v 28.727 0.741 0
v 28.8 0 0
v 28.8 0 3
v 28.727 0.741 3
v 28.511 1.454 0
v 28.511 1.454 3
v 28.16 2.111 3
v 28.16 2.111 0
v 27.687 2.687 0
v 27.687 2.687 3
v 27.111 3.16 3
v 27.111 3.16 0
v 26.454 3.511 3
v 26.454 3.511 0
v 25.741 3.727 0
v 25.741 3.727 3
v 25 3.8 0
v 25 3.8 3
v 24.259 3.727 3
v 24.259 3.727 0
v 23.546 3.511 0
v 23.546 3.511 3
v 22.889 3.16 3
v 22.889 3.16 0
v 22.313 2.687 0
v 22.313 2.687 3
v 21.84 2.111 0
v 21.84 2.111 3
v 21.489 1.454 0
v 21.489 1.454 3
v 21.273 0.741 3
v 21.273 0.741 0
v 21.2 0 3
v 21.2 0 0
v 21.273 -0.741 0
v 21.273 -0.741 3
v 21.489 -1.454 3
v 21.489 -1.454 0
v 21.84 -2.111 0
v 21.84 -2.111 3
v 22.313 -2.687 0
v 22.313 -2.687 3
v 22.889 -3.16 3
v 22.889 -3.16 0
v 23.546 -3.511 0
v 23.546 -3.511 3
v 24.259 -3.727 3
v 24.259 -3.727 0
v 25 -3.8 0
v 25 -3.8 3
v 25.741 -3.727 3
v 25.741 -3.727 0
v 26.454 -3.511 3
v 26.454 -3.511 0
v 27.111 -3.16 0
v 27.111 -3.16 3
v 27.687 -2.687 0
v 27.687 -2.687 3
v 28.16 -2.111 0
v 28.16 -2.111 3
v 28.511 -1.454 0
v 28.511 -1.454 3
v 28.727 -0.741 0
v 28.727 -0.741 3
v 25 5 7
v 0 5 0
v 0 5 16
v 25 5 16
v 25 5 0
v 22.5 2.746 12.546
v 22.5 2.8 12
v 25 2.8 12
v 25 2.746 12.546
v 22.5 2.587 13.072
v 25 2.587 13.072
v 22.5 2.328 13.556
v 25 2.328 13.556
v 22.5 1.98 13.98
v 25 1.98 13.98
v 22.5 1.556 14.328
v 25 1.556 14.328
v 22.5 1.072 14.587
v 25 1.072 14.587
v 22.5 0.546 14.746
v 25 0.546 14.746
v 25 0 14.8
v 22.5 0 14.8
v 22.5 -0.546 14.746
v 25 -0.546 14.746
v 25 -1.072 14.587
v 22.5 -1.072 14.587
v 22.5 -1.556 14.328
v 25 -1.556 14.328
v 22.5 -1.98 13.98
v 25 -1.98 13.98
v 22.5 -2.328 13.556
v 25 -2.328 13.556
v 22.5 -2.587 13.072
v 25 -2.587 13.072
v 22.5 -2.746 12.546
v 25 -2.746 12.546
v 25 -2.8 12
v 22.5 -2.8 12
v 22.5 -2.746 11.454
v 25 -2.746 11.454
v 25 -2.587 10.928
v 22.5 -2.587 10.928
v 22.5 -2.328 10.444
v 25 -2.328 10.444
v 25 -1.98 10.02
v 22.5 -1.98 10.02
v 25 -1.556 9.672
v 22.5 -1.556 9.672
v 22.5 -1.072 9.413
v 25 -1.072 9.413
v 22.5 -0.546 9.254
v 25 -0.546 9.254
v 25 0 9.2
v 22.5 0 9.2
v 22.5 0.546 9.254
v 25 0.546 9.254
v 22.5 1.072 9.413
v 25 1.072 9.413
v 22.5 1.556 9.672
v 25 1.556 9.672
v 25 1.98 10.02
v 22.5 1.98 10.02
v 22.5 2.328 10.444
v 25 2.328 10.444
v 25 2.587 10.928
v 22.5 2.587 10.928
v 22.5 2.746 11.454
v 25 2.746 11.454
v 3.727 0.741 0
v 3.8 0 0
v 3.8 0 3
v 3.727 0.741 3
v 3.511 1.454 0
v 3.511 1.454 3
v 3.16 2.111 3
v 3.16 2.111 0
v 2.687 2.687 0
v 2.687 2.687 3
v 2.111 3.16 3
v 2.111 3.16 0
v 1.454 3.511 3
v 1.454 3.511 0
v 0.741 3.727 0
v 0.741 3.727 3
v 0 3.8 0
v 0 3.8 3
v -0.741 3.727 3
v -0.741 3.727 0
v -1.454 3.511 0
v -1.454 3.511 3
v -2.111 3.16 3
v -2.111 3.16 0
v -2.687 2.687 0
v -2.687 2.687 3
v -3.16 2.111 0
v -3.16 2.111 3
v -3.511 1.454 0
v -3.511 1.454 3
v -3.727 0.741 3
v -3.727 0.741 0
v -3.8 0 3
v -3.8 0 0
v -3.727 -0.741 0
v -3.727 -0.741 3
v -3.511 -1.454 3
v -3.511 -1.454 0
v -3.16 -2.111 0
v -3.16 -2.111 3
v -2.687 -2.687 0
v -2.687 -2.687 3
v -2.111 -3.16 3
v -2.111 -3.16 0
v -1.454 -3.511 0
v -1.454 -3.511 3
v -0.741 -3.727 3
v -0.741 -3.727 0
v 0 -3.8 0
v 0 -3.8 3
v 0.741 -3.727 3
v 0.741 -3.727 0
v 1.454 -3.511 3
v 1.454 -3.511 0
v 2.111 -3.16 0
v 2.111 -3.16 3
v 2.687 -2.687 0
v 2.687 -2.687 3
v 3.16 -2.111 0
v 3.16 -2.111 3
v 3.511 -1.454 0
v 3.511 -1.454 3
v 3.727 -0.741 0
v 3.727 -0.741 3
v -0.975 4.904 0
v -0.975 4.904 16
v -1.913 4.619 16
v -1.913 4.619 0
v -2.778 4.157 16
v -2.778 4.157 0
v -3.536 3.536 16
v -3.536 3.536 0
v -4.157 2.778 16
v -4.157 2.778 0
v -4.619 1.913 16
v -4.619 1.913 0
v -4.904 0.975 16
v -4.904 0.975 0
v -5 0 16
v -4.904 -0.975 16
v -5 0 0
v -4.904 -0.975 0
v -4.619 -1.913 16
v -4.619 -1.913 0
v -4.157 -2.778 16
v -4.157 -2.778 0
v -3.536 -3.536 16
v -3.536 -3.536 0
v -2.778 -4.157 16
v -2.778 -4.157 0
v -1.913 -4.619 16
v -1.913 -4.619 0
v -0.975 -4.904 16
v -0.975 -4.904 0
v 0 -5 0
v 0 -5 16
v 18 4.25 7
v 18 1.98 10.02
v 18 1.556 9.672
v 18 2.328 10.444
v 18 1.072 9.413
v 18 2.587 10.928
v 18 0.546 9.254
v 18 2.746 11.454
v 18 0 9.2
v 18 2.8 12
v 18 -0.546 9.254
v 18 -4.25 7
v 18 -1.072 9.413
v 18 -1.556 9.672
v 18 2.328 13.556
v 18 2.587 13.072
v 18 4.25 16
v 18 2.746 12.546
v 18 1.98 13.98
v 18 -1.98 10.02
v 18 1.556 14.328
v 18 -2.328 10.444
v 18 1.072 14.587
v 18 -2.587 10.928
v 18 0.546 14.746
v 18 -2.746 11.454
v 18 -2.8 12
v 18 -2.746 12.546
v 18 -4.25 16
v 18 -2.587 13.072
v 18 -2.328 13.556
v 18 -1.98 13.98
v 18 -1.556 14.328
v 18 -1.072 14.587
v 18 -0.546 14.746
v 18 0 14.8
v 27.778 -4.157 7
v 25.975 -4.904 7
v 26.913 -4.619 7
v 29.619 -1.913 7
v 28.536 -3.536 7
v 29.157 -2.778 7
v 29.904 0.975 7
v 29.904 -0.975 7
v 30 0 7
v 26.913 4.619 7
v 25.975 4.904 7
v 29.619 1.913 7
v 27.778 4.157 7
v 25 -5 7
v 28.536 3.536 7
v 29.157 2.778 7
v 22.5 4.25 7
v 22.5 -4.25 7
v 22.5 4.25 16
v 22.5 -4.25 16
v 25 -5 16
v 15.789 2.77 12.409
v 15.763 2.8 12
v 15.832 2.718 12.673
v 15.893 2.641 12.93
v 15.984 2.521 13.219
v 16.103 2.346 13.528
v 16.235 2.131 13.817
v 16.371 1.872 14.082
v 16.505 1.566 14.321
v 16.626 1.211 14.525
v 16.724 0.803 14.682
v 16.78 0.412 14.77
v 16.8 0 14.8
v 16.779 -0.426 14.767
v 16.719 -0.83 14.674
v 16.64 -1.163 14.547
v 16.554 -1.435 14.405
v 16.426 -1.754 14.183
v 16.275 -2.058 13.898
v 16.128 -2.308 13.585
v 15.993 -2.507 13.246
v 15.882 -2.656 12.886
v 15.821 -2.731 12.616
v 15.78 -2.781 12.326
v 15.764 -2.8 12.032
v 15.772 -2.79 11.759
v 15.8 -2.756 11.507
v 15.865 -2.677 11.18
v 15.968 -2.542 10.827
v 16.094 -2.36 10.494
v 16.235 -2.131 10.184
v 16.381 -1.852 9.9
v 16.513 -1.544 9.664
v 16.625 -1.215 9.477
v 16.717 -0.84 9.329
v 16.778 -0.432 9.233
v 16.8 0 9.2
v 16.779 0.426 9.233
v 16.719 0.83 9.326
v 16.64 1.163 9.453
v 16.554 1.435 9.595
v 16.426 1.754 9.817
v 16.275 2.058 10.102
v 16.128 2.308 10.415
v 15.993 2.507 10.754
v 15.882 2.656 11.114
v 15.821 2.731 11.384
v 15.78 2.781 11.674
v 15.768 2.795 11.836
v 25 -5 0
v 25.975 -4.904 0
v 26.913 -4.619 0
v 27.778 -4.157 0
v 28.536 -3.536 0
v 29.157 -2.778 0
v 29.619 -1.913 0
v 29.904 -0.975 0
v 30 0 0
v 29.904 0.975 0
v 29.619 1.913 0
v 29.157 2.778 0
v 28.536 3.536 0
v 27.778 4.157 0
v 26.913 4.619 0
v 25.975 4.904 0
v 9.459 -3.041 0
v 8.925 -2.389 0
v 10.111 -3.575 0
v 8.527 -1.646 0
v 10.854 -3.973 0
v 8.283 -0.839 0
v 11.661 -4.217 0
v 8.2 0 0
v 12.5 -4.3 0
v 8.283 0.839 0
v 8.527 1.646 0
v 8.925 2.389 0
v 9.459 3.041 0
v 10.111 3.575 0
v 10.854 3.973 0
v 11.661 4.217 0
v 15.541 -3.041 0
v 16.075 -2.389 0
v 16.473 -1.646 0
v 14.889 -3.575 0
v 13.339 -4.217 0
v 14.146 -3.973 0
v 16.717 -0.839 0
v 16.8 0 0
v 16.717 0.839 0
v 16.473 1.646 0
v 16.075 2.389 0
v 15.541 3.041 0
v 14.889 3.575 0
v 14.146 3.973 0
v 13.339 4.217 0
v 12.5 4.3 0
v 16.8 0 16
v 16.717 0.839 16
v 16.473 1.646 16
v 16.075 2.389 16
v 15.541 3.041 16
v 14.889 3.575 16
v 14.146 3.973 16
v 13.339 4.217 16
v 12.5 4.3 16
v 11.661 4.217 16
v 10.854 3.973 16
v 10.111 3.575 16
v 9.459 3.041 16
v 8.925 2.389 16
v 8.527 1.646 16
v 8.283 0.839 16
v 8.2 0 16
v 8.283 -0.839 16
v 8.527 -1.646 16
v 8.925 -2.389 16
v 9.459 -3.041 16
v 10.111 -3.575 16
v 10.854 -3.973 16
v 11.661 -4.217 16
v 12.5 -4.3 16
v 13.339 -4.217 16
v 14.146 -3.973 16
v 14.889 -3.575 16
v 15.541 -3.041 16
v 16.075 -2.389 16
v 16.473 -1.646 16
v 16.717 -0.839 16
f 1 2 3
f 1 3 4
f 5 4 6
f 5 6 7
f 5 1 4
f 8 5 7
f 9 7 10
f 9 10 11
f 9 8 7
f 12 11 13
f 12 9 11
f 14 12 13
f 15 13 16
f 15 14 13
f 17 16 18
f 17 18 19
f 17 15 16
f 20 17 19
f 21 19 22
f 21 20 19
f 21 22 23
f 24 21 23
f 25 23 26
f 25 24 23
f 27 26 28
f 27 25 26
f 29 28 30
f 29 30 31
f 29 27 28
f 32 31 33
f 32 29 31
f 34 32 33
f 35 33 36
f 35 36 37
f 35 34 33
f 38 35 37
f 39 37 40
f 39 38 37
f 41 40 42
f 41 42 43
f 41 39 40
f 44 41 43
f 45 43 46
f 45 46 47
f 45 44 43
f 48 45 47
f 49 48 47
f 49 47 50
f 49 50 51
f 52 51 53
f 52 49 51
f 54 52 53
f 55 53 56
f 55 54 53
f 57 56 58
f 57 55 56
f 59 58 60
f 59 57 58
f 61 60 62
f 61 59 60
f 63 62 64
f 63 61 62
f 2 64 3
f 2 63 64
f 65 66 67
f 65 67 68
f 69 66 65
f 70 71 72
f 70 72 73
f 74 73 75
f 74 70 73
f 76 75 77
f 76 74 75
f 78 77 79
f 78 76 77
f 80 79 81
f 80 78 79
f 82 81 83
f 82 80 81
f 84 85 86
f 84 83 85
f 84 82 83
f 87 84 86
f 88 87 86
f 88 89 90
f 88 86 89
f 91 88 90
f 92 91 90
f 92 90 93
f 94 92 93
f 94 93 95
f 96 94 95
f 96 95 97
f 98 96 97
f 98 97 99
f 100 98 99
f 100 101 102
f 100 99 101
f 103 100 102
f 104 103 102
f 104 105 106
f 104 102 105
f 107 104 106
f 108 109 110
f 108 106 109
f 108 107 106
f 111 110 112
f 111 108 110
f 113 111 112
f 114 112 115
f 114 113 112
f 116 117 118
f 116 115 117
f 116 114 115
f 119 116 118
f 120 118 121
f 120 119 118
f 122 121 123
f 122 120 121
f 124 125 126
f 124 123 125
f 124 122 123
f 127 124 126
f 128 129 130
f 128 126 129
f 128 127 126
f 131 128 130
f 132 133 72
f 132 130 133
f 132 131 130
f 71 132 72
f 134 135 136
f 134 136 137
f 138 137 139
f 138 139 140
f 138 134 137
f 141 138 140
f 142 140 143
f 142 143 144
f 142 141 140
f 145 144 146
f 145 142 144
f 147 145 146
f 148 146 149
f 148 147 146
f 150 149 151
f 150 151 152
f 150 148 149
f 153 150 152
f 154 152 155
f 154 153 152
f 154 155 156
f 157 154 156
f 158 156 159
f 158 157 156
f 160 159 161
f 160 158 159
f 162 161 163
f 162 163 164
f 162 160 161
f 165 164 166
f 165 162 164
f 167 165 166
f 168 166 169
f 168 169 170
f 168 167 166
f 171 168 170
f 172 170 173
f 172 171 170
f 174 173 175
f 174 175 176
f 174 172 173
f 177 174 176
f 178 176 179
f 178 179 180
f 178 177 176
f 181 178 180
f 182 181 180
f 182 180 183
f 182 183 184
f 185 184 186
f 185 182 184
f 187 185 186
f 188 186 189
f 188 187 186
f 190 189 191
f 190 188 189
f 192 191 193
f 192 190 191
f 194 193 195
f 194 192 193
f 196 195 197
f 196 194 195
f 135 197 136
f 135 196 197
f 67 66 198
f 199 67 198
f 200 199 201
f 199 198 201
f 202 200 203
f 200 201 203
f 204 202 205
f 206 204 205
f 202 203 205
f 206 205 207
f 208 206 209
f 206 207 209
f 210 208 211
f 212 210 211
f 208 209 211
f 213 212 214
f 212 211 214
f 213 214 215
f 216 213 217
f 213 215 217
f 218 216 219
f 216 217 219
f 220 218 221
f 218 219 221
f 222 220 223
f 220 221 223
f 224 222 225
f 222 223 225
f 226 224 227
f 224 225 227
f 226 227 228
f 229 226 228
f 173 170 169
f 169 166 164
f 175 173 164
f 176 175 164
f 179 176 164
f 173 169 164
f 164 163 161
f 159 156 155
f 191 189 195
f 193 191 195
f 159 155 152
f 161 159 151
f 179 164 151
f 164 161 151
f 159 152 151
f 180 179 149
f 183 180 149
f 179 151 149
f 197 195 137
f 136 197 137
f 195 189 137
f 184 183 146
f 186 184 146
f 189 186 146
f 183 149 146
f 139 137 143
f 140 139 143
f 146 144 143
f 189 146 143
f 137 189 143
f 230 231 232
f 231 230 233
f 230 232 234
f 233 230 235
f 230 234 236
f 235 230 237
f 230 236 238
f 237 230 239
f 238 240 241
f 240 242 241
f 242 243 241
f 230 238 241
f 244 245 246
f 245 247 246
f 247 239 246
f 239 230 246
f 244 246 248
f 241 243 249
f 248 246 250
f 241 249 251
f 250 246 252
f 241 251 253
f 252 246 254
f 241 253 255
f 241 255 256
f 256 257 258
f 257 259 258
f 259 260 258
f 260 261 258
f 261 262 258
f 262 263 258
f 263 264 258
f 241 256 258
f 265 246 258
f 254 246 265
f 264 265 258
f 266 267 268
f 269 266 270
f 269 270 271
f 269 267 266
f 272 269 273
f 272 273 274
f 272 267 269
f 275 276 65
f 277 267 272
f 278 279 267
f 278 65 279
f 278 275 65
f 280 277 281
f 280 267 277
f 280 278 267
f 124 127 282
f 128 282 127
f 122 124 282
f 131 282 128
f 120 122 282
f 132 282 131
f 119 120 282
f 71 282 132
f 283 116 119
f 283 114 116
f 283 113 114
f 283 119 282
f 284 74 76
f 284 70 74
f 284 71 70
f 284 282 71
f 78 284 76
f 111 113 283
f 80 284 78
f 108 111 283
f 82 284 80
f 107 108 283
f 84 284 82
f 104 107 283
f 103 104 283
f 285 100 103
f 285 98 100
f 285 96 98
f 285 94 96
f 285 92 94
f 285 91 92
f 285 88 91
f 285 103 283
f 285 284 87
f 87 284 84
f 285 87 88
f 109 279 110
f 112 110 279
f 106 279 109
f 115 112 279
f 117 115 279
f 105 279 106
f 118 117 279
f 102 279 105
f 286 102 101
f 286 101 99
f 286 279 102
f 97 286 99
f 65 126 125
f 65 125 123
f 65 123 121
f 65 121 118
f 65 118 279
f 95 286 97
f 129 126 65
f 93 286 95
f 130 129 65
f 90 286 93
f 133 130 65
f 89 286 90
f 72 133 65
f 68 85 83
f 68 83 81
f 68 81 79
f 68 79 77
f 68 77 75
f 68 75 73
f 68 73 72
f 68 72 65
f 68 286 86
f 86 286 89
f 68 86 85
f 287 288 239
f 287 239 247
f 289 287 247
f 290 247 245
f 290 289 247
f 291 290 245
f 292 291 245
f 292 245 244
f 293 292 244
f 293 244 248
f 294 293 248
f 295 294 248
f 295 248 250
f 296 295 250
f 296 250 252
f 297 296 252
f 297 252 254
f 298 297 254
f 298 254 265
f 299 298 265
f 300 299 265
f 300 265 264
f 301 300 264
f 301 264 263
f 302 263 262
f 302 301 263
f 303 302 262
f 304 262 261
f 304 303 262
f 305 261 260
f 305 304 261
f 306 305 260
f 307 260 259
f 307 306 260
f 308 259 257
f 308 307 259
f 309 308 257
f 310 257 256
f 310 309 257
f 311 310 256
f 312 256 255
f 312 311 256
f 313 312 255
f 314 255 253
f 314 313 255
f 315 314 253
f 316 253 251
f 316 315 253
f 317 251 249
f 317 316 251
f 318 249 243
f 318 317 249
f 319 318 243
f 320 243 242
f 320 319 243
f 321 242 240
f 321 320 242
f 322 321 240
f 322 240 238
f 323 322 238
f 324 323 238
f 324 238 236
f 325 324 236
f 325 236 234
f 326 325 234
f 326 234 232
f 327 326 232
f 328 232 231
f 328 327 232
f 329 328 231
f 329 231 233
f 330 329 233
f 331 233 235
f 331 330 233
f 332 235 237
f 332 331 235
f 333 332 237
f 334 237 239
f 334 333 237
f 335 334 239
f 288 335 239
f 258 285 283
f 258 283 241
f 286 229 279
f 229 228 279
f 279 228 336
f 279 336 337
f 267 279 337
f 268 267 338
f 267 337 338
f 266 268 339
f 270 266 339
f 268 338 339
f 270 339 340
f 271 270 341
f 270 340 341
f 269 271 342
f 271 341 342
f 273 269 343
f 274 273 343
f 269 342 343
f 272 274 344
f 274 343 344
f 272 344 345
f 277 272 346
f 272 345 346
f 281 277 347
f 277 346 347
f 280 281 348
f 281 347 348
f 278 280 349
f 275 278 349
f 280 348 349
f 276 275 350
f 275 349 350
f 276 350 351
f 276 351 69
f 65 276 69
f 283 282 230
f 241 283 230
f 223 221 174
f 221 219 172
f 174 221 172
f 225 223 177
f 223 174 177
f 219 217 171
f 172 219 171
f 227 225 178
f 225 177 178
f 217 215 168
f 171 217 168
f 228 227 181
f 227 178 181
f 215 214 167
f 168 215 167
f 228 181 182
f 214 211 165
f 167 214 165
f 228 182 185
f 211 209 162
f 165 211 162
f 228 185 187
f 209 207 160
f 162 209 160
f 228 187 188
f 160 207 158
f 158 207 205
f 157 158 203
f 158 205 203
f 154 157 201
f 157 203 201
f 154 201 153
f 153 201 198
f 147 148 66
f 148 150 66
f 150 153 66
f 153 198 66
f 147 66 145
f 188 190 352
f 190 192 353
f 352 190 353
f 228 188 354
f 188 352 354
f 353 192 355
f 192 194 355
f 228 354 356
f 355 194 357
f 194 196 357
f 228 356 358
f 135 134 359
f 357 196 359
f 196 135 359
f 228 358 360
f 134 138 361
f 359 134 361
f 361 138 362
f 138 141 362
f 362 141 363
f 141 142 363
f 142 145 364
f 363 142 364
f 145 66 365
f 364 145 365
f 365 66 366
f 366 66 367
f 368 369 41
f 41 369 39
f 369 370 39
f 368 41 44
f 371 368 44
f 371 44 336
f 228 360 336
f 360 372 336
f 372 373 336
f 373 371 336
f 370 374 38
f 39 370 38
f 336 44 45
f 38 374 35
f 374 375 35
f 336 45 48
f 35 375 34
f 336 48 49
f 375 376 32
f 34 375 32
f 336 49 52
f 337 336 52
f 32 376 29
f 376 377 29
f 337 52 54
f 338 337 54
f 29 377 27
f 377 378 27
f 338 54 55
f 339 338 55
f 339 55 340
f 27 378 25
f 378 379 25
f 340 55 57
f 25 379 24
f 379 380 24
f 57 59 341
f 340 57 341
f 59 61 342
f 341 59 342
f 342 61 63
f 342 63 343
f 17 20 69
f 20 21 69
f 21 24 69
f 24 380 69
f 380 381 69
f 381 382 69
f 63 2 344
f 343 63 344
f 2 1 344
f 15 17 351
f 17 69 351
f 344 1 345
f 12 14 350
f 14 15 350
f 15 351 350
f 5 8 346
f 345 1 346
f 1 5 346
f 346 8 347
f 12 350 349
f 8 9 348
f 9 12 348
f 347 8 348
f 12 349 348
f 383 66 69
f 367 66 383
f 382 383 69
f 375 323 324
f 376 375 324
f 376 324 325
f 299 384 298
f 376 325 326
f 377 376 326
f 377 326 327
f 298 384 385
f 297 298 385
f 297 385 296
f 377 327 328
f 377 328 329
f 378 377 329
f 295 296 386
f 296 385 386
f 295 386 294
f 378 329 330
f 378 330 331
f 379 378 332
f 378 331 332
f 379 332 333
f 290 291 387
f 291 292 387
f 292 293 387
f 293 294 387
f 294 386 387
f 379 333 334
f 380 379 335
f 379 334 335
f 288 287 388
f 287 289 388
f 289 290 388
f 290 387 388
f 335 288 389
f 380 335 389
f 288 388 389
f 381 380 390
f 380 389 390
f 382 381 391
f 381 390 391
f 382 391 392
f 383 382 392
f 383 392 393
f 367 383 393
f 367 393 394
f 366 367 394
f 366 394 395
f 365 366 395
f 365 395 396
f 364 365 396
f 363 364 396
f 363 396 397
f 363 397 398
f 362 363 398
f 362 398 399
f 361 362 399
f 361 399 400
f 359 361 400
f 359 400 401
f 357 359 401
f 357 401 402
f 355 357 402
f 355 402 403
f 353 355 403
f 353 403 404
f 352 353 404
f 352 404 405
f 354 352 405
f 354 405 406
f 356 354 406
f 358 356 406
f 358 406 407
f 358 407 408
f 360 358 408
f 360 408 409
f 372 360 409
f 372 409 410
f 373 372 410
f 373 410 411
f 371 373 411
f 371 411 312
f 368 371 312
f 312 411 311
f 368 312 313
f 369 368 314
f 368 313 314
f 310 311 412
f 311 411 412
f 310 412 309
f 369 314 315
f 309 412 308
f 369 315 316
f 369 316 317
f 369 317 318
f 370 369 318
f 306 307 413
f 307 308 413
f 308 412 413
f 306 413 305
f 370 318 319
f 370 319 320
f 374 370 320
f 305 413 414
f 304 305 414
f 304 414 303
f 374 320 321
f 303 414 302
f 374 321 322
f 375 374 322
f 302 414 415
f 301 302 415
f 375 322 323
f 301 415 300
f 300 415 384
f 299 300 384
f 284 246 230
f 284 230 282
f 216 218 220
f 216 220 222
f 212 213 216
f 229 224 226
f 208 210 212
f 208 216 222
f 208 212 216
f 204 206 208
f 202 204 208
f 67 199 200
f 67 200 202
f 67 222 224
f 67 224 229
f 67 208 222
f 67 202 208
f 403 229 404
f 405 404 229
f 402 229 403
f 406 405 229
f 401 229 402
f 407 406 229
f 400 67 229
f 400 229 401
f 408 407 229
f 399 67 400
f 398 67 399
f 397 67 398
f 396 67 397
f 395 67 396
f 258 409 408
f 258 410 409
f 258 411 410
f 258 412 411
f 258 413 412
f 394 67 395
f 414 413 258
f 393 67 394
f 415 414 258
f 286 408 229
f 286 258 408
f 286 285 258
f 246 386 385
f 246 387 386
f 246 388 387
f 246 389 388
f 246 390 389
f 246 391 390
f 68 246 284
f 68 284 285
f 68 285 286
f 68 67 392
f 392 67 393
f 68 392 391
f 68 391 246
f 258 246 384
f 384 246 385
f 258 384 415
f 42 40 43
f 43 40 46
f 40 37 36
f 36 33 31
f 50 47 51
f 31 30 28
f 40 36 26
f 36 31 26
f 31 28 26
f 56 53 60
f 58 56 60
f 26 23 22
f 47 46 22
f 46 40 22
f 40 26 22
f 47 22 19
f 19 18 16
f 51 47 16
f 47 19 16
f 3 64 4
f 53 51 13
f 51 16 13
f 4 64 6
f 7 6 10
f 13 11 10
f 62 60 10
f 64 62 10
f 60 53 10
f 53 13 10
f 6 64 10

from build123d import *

# Parameters (mm, degrees)
SKETCH_R        = 3.8
PAD_DEPTH       = 3
PAD001_DEPTH    = 13
SKETCH002_R     = 4.3
POCKET_DEPTH    = 16.001
POCKET001_DEPTH = 9
SKETCH004_R     = 2.8
POCKET002_DEPTH = 20.001


with BuildPart() as part:
    # Sketch → Pad (new body)
    with BuildSketch(Plane.XY):
        with BuildLine():
            ThreePointArc((0, 5), (-5, 0), (0, -5))
            Line((0, -5), (25, -5))
            ThreePointArc((25, -5), (30, 0), (25, 5))
            Line((0, 5), (25, 5))
        make_face()
        Circle(SKETCH_R, mode=Mode.SUBTRACT)
        with Locations((25, 0)):
            Circle(SKETCH_R, mode=Mode.SUBTRACT)
    extrude(amount=PAD_DEPTH)

    # Sketch001 (on Face8 of Pad) → Pad001 (join)
    with BuildSketch(Plane.XY.offset(3)):
        with BuildLine():
            ThreePointArc((0, 5), (-5, 0), (0, -5))
            Line((0, -5), (25, -5))
            ThreePointArc((25, -5), (30, 0), (25, 5))
            Line((0, 5), (25, 5))
        make_face()
    extrude(amount=PAD001_DEPTH)

    # Sketch002 (on Face14 of Pad001) → Pocket (cut, through all)
    with BuildSketch(Plane.XY.offset(16)):
        with Locations((12.5, 0)):
            Circle(SKETCH002_R)
    extrude(amount=-POCKET_DEPTH, mode=Mode.SUBTRACT)

    # Sketch003 (on Face13 of Pocket) → Pocket001 (cut)
    with BuildSketch(Plane.XY.offset(16)):
        Polygon((18, 4.25), (22.5, 4.25), (22.5, -4.25), (18, -4.25), (18, 0), align=None)
        with BuildLine():
            Line((25, 0), (25, 5))
            ThreePointArc((25, -5), (30, 0), (25, 5))
            Line((25, -5), (25, 0))
        make_face()
    extrude(amount=-POCKET001_DEPTH, mode=Mode.SUBTRACT)

    # Sketch004 → Pocket002 (cut, through all)
    with BuildSketch(Plane.YZ.offset(10)):
        with Locations((0, 12)):
            Circle(SKETCH004_R)
    extrude(amount=POCKET002_DEPTH, mode=Mode.SUBTRACT)


solid = part.part
